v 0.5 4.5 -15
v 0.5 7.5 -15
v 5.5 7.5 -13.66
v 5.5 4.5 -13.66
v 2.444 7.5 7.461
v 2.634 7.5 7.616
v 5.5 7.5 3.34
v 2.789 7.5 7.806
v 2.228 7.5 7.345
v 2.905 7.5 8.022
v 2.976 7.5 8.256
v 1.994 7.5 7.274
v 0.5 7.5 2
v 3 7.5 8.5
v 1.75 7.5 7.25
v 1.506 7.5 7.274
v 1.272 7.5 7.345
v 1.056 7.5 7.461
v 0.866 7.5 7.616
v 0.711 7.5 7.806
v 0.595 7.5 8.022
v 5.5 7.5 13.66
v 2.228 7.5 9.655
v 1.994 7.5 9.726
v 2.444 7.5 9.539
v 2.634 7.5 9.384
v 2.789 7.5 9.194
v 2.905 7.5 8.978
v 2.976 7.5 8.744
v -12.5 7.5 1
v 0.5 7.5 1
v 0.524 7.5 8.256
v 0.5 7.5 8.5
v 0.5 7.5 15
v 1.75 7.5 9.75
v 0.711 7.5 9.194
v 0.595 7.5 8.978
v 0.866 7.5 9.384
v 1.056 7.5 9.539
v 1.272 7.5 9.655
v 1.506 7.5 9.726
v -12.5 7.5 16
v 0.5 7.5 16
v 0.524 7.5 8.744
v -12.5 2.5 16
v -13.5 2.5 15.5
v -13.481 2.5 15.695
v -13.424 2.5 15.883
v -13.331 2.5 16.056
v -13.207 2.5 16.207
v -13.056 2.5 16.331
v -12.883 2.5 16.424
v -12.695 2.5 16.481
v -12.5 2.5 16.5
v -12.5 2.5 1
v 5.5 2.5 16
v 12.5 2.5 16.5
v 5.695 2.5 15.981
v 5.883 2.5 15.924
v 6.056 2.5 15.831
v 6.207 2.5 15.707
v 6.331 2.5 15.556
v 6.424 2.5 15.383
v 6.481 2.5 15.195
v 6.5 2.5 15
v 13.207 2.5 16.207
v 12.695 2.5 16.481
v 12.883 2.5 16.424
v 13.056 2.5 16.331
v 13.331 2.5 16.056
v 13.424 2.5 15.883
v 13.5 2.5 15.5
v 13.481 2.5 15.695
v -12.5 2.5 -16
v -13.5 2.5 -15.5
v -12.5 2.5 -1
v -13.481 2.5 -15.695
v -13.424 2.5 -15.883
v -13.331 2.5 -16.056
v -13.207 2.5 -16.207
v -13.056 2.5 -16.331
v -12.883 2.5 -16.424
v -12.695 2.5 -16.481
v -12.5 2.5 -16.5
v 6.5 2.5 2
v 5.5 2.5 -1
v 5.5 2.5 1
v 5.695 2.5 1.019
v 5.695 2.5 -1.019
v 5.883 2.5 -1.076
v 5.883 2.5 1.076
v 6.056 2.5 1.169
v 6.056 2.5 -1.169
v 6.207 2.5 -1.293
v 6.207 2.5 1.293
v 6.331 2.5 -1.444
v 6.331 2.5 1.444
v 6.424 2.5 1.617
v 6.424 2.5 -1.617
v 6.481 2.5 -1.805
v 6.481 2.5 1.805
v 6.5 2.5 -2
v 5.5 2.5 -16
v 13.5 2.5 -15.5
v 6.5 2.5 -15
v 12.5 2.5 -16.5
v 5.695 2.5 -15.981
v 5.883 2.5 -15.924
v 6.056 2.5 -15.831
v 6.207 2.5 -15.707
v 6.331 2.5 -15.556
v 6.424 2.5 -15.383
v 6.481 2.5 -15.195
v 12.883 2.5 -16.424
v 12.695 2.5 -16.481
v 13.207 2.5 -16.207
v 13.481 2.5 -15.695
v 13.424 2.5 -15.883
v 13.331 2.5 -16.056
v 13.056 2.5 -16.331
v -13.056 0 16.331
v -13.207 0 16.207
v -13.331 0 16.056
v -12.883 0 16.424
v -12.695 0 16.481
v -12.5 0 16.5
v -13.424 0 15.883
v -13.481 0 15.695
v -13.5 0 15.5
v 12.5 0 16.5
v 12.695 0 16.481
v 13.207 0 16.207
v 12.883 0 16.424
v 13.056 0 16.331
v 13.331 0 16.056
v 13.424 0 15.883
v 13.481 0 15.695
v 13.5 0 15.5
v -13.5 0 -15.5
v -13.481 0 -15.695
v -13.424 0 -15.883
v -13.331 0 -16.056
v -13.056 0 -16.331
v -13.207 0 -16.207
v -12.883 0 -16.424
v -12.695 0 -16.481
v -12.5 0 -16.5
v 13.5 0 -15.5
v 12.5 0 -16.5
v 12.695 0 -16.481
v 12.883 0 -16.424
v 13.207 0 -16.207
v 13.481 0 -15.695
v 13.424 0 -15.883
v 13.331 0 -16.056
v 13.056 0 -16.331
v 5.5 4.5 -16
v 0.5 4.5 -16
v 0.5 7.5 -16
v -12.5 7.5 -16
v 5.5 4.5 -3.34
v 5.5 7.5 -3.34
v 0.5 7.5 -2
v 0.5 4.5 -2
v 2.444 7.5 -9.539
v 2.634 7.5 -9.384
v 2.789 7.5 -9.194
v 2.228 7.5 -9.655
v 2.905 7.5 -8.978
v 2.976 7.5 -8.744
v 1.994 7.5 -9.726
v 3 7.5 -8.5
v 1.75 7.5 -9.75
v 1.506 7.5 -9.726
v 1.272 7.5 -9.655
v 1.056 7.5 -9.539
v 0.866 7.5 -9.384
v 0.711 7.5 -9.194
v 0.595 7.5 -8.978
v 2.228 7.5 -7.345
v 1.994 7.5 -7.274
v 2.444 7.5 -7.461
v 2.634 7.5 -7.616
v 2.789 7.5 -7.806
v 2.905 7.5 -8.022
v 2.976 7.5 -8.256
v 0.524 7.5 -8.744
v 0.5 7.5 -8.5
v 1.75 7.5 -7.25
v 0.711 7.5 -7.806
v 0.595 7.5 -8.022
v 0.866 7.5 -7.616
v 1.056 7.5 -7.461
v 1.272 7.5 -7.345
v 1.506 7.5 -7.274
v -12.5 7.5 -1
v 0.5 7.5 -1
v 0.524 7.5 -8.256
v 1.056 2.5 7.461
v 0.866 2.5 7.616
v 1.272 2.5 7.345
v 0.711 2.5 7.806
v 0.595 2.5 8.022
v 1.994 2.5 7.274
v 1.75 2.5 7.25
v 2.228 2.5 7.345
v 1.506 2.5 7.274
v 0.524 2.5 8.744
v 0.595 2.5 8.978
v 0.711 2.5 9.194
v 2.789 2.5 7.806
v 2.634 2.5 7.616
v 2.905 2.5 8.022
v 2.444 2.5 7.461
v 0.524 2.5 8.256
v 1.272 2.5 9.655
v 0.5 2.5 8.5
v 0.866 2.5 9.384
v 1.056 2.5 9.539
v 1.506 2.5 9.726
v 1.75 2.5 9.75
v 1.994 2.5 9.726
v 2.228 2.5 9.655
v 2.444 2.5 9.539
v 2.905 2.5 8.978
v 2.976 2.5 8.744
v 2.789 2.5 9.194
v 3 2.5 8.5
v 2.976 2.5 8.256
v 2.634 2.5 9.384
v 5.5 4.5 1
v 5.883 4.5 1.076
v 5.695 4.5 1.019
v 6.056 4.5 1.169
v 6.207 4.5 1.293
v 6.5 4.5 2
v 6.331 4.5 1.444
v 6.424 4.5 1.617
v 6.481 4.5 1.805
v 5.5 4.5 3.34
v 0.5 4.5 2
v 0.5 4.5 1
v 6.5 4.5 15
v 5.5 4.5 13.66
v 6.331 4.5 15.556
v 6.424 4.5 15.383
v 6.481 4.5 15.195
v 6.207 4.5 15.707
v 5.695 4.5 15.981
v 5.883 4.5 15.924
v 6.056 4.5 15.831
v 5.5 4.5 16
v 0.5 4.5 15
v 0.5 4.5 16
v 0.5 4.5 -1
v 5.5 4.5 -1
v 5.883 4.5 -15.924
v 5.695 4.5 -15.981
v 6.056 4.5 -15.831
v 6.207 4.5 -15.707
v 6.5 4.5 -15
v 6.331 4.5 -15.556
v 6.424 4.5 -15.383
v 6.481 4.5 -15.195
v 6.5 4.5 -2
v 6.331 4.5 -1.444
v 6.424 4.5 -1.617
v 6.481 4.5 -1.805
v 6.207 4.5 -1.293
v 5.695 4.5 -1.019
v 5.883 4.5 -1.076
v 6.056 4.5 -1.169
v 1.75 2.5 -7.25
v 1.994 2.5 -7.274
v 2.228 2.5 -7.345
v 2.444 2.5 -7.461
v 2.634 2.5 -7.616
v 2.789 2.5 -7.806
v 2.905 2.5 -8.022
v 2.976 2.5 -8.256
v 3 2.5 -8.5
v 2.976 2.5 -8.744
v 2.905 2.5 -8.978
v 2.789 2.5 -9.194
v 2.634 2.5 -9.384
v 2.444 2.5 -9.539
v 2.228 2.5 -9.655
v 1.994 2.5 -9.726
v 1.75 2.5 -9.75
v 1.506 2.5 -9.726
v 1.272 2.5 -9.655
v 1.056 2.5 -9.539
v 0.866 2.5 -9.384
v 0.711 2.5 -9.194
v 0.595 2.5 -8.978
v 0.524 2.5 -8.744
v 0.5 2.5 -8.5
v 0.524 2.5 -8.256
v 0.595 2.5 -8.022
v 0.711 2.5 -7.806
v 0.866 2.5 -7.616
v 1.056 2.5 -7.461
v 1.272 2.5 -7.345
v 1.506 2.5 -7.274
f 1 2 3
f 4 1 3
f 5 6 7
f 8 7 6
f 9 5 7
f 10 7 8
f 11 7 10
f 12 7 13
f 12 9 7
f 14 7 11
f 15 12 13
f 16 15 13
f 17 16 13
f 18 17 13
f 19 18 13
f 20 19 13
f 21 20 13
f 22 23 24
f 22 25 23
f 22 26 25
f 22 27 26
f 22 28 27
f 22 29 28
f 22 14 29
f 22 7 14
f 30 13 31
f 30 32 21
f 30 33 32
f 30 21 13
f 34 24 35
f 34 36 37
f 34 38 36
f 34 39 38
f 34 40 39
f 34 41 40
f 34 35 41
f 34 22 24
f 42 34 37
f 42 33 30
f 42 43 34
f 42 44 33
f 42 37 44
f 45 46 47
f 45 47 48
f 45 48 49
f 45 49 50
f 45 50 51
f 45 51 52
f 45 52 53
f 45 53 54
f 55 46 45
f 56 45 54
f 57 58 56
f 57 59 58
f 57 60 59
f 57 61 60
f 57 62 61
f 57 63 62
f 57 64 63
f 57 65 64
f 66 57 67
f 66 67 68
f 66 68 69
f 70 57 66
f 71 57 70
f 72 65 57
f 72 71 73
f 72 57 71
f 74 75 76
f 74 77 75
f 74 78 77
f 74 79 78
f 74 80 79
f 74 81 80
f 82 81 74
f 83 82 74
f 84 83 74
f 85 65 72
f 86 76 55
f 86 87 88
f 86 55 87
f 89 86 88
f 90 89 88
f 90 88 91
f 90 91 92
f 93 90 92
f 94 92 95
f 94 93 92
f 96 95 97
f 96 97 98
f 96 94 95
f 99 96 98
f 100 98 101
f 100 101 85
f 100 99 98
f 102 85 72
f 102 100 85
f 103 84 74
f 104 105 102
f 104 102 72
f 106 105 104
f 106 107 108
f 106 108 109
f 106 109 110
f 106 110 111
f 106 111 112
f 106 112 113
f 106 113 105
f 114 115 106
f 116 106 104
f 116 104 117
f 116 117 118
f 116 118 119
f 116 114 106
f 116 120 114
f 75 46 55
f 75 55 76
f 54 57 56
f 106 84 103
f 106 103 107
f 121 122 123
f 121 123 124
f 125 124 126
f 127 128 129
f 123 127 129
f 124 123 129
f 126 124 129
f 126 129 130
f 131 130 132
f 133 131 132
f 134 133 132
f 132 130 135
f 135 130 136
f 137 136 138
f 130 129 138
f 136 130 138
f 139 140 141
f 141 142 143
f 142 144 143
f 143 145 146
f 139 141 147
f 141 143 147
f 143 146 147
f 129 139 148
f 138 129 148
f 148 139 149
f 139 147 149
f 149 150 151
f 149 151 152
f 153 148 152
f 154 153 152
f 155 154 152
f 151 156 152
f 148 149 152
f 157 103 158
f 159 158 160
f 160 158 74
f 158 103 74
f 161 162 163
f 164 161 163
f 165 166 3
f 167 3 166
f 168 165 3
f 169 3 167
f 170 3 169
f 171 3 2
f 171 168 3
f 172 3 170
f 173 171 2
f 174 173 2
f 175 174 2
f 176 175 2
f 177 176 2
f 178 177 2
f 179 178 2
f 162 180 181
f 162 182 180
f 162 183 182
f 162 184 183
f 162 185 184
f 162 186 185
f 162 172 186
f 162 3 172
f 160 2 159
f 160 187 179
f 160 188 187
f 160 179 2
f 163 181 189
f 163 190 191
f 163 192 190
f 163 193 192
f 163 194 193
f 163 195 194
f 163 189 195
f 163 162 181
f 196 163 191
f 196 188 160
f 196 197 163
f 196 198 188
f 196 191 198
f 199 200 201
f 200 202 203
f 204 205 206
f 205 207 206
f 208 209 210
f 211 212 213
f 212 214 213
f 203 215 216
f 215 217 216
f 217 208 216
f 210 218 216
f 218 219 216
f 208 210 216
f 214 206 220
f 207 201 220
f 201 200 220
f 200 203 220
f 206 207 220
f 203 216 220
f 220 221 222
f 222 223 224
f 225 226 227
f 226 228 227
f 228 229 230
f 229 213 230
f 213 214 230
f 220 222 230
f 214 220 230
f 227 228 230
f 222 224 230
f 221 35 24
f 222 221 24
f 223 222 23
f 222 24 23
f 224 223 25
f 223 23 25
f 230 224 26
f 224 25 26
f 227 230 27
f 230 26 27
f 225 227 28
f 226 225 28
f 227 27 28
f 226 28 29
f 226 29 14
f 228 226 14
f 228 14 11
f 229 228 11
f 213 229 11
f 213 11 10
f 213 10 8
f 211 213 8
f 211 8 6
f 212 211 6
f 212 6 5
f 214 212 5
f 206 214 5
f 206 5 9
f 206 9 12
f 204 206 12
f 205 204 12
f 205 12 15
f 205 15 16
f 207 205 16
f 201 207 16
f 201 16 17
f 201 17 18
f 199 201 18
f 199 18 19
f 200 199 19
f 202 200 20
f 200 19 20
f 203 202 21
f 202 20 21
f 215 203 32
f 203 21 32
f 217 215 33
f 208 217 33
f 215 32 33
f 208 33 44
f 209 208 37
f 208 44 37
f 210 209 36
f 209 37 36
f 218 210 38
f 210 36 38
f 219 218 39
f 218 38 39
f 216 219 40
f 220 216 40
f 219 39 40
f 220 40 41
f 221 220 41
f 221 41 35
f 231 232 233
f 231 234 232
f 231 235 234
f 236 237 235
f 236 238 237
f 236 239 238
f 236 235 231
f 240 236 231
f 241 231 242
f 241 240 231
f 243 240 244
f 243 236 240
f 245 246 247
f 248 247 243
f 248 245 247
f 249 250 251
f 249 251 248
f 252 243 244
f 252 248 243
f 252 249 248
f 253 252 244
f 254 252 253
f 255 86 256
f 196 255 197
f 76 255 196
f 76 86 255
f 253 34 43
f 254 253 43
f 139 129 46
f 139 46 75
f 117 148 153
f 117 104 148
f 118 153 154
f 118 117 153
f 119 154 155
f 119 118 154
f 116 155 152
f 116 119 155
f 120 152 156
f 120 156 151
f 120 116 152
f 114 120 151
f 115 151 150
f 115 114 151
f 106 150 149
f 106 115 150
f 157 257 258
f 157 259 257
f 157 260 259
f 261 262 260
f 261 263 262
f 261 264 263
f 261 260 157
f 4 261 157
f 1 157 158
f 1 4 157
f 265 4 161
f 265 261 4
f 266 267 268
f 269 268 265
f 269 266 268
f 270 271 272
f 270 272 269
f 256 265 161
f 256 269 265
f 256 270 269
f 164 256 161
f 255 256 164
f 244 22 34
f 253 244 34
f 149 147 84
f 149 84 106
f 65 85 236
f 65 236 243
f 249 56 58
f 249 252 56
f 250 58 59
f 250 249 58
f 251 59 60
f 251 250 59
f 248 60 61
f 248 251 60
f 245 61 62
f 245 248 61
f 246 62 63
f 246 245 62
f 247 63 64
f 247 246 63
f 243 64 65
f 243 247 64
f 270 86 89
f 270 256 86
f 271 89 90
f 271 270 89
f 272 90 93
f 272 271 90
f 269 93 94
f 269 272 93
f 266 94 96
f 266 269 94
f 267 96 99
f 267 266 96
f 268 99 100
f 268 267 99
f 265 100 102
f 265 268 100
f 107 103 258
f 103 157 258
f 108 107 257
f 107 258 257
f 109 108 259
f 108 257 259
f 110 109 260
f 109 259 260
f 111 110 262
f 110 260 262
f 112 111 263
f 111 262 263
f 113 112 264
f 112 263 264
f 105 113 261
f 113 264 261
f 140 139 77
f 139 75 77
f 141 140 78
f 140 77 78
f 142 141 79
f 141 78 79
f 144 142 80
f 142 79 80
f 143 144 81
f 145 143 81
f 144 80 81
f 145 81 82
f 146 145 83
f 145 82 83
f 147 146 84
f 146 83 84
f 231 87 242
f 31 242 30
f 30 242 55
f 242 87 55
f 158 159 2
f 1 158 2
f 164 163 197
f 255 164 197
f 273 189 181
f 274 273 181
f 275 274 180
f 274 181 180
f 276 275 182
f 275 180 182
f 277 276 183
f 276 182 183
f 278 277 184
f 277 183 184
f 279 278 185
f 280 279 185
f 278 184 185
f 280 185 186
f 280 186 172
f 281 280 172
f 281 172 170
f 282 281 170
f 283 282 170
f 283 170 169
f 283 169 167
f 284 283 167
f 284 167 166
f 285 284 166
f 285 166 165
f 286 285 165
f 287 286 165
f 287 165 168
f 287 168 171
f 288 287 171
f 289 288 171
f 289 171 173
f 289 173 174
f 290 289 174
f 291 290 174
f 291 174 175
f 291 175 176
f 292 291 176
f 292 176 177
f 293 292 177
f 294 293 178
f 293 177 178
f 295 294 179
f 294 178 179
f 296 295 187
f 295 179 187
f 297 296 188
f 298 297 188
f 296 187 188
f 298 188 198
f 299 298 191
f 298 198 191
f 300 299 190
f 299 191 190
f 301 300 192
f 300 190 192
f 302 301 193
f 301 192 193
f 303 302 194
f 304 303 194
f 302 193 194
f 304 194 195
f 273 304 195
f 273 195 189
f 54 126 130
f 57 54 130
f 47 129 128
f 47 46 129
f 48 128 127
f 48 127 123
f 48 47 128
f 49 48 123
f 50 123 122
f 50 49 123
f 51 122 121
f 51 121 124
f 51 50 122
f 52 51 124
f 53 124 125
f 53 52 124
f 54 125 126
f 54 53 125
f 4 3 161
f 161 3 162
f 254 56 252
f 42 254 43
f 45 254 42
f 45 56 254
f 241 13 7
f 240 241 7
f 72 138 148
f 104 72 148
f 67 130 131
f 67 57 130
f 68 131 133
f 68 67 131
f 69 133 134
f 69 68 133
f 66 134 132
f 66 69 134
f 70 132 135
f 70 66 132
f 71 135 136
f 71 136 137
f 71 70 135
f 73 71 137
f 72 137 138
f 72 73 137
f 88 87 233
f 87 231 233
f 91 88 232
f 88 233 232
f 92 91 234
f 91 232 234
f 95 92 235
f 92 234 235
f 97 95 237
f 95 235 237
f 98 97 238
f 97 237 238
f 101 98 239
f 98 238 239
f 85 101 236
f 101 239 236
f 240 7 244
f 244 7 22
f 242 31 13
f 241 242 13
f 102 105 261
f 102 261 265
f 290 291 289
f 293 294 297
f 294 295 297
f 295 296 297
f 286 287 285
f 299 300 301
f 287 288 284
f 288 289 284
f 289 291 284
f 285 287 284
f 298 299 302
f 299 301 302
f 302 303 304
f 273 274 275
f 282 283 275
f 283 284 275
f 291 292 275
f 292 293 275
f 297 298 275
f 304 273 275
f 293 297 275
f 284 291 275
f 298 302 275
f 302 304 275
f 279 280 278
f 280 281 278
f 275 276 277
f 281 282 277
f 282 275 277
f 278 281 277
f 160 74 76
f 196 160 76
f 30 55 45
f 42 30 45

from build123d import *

# Parameters (mm, degrees)
SKETCH1_W              = 27
SKETCH1_H              = 33
EXTRUDE1_DEPTH         = 2.5
FILLET1_R              = 1
SKETCH2_W              = 19
SKETCH2_H              = 15
EXTRUDE2_DEPTH         = 5
CUT_EXTRUDE1_DEPTH     = 3
FILLET2_R              = 1
SKETCH4_R              = 1.25
CUT_EXTRUDE2_DEPTH     = 23.59977876
LPATTERN1_COUNT        = 2
LPATTERN1_PITCH        = 17
FILLET2_OF_LPATTERN1_R = 1
SKETCH5_W              = 8.254105746
SKETCH5_H              = 23.141343318
EXTRUDE3_DEPTH         = 2.5


with BuildPart() as part:
    # Sketch1 → Extrude1 (new body)
    with BuildSketch(Plane(origin=(0, 0, 0), x_dir=(1, 0, 0), z_dir=(0, 1, 0))):
        Rectangle(SKETCH1_W, SKETCH1_H)
    extrude(amount=EXTRUDE1_DEPTH)

    # Fillet1
    fillet1_edges = [part.edges().sort_by_distance(p)[0] for p in [
        (-13.5, 1.25, -16.5),
        (13.5, 1.25, -16.5),
        (13.5, 1.25, 16.5),
        (-13.5, 1.25, 16.5),
    ]]
    fillet(fillet1_edges, radius=FILLET1_R)

    # Sketch2 → Extrude2 (add)
    with BuildSketch(Plane(origin=(0, 2.5, 0), x_dir=(-1, 0, 0), z_dir=(0, 1, 0))):
        with Locations((3, 8.5)):
            Rectangle(SKETCH2_W, SKETCH2_H)
    extrude2 = extrude(amount=EXTRUDE2_DEPTH)

    # Sketch3 → Cut-Extrude1 (cut)
    with BuildSketch(Plane(origin=(0, 7.5, 0), x_dir=(-1, 0, 0), z_dir=(0, 1, 0))):
        Polygon((-0.5, 16), (-6.5, 16), (-6.5, 1), (-0.5, 1), (-0.5, 2), (-5.5, 3.339745962), (-5.5, 13.660254038), (-0.5, 15), align=None)
    cut_extrude1 = extrude(amount=-CUT_EXTRUDE1_DEPTH, mode=Mode.SUBTRACT)

    # Fillet2
    fillet2_edges = [part.edges().sort_by_distance(p)[0] for p in [
        (6.5, 3.5, 1),
        (6.5, 3.5, 16),
    ]]
    fillet(fillet2_edges, radius=FILLET2_R)

    # Sketch4 → Cut-Extrude2 (cut, through all)
    with BuildSketch(Plane(origin=(0, 7.5, 0), x_dir=(-1, 0, 0), z_dir=(0, 1, 0))):
        with Locations(Location((-1.75, 8.5, 0), (0, 0, 90))):
            Circle(SKETCH4_R)
    cut_extrude2 = extrude(amount=-CUT_EXTRUDE2_DEPTH, mode=Mode.SUBTRACT)

    # LPattern1: Extrude2, Cut-Extrude1, Cut-Extrude2 ×2
    with Locations(*[(0, 0, -i * LPATTERN1_PITCH) for i in range(1, LPATTERN1_COUNT)]):
        add(extrude2)
        add(cut_extrude1, mode=Mode.SUBTRACT)
        add(cut_extrude2, mode=Mode.SUBTRACT)

    # Fillet2 of LPattern1
    fillet2_of_lpattern1_edges = [part.edges().sort_by_distance(p)[0] for p in [
        (6.5, 3.5, -16),
        (6.5, 3.5, -1),
    ]]
    fillet(fillet2_of_lpattern1_edges, radius=FILLET2_OF_LPATTERN1_R)

    # Sketch5 → Extrude3 (add)
    with BuildSketch(Plane.XZ):
        with Locations((1.09884186, 0.082461012)):
            Rectangle(SKETCH5_W, SKETCH5_H)
    extrude(amount=-EXTRUDE3_DEPTH)


solid = part.part
